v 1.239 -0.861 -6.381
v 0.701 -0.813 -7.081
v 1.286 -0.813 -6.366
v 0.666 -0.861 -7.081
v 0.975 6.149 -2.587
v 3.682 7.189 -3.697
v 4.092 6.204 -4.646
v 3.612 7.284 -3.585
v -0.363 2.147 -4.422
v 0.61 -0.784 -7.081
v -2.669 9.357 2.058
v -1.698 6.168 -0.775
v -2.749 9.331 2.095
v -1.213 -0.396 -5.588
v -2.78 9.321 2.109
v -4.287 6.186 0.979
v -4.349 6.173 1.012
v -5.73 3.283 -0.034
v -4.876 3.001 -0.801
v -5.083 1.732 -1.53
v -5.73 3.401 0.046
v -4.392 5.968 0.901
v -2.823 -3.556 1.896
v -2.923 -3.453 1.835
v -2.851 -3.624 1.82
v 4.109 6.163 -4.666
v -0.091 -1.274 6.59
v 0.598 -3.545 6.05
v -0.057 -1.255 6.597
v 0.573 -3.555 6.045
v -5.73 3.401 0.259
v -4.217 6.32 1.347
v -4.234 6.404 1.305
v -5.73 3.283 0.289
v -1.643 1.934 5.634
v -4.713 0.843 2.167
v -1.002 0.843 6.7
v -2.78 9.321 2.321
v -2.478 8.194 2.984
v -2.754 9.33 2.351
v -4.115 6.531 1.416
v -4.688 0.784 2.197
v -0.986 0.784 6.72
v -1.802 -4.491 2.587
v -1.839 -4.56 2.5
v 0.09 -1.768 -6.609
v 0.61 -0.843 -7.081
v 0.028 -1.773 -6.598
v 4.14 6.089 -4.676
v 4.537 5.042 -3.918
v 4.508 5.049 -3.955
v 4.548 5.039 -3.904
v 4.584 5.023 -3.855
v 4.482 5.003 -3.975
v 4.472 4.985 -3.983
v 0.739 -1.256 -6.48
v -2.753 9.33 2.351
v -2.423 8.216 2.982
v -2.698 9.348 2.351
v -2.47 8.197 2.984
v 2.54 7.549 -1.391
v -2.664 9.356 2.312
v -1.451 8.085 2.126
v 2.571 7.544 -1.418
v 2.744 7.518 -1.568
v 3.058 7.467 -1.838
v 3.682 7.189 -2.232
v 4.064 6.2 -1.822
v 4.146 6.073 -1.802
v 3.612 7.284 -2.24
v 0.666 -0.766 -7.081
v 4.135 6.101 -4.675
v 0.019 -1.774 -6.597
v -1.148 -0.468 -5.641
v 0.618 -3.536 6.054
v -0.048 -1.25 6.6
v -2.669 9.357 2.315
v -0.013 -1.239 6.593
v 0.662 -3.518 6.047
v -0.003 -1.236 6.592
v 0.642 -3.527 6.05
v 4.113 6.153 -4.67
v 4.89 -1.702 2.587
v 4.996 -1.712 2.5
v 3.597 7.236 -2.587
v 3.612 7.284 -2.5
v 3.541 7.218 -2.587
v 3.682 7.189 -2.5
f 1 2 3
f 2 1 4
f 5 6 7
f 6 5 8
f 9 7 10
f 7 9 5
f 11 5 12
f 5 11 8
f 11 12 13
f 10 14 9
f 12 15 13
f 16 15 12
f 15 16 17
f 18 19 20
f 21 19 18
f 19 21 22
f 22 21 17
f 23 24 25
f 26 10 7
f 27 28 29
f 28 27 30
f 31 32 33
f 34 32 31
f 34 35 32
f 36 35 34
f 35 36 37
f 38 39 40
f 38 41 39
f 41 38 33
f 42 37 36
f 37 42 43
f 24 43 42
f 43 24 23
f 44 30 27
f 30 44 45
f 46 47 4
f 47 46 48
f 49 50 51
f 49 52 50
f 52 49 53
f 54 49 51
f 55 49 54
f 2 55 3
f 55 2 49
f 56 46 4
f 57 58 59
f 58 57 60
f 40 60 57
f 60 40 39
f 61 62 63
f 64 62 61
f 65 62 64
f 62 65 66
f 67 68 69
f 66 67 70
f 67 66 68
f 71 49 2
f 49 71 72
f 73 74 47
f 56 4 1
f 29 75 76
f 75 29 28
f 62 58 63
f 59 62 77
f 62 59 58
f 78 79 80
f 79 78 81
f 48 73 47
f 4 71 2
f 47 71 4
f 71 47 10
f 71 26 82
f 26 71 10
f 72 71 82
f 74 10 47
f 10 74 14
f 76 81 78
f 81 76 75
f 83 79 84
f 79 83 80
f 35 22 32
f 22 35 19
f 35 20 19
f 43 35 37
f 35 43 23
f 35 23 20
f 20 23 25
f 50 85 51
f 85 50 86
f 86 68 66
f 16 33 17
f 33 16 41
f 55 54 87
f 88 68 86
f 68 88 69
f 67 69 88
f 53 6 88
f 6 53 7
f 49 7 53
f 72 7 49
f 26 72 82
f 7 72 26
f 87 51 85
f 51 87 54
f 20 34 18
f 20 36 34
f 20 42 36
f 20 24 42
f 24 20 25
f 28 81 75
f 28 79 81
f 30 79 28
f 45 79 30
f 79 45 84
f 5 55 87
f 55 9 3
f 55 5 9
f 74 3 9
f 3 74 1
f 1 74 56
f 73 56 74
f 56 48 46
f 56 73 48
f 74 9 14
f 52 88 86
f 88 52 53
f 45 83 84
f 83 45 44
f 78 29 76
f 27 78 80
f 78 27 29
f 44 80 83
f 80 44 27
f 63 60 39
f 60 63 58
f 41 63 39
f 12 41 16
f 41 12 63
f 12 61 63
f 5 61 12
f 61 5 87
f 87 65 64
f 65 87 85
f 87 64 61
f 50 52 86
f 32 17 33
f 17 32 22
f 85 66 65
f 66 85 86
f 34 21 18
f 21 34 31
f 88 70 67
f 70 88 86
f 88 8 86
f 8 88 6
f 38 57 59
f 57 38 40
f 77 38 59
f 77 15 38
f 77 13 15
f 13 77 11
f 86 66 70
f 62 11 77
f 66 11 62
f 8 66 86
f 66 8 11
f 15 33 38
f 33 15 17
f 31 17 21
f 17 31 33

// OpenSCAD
// Auto-generated OpenSCAD file

    inner_points = 10*[[0.06319597715687762, 0.1268463153899368, 1.0], [-0.2699443063437531, 0.9262320492567245, 0.5000000000006233], [0.691291687541074, -0.08050791918503769, -0.750000000000228], [-0.2317594497271782, -0.4651851838989617, -0.7500000000003951], [0.6912916875411965, -0.08050791918576636, 0.24999999999977196], [-0.23175944972705564, -0.4651851838996903, 0.24999999999960476], [0.3581514040405658, 0.7188778146810213, -0.24999999999960476], [-0.5648997332276864, 0.33420054996709736, -0.24999999999977196]];

    outer_points = 10*[[-0.4257137914058795, -0.8544883437355262, -0.29768681231614647], [0.20766159975206822, -0.8544883437355262, 0.47615788390882396], [0.490793922669076, 0.7731461234147987, -0.40170436557220773], [-0.27274173101526467, 0.9358305640562536, 0.22323329397953012], [0.06508013126319645, -0.08134222032072741, -0.6993911778883541], [-0.6984555224211442, 0.08134222032072741, -0.07445351833661629], [0.6984555224211442, -0.08134222032072741, 0.07445351833661629], [-0.06508013126319645, 0.08134222032072741, 0.6993911778883541]];

    // Convex hull for inner set (I)
    module inner_hull() {
        hull() {
            for (p = inner_points) {
                translate(p) sphere(r=0.1);
            }
        }
    }

    // Convex hull for outer set (O) minus inner hull (O \ I)
    module outer_minus_inner() {
        difference() {
            hull() {
                for (p = outer_points) {
                    translate(p) sphere(r=0.1);
                }
            }
            inner_hull(); // Subtract inner hull
        }
    }

    // Convex hull for outer set (O) minus all translated inner hulls
    module outer_minus_AllTranslationInner() {
        difference() {
            hull() {
                for (p = outer_points) {
                    translate(p) sphere(r=0.1);
                }
            }
            hull() {
                translate([0,0,50]) inner_hull();
                translate([0,0,-50]) inner_hull();
            }; // Subtract translated inner hulls
        }
    }

    // Difference between outer_minus_inner and outer_minus_AllTranslationInner
    module outer_minus_inner_diff() {
        difference() {
            // Outer minus inner
            difference() {
                hull() {
                    for (p = outer_points) {
                        translate(p) sphere(r=0.1);
                    }
                }
                inner_hull();
            }

            // Subtract Outer minus AllTranslationInner
            difference() {
                hull() {
                    for (p = outer_points) {
                        translate(p) sphere(r=0.1);
                    }
                }
                hull() {
                    translate([0,0,50]) inner_hull();
                    translate([0,0,-50]) inner_hull();
                };
            }
        }
    }

    // Rendering all with colors applied
    color([1, 1, 0, 1]) outer_minus_inner_diff(); // Opaque yellow
    
